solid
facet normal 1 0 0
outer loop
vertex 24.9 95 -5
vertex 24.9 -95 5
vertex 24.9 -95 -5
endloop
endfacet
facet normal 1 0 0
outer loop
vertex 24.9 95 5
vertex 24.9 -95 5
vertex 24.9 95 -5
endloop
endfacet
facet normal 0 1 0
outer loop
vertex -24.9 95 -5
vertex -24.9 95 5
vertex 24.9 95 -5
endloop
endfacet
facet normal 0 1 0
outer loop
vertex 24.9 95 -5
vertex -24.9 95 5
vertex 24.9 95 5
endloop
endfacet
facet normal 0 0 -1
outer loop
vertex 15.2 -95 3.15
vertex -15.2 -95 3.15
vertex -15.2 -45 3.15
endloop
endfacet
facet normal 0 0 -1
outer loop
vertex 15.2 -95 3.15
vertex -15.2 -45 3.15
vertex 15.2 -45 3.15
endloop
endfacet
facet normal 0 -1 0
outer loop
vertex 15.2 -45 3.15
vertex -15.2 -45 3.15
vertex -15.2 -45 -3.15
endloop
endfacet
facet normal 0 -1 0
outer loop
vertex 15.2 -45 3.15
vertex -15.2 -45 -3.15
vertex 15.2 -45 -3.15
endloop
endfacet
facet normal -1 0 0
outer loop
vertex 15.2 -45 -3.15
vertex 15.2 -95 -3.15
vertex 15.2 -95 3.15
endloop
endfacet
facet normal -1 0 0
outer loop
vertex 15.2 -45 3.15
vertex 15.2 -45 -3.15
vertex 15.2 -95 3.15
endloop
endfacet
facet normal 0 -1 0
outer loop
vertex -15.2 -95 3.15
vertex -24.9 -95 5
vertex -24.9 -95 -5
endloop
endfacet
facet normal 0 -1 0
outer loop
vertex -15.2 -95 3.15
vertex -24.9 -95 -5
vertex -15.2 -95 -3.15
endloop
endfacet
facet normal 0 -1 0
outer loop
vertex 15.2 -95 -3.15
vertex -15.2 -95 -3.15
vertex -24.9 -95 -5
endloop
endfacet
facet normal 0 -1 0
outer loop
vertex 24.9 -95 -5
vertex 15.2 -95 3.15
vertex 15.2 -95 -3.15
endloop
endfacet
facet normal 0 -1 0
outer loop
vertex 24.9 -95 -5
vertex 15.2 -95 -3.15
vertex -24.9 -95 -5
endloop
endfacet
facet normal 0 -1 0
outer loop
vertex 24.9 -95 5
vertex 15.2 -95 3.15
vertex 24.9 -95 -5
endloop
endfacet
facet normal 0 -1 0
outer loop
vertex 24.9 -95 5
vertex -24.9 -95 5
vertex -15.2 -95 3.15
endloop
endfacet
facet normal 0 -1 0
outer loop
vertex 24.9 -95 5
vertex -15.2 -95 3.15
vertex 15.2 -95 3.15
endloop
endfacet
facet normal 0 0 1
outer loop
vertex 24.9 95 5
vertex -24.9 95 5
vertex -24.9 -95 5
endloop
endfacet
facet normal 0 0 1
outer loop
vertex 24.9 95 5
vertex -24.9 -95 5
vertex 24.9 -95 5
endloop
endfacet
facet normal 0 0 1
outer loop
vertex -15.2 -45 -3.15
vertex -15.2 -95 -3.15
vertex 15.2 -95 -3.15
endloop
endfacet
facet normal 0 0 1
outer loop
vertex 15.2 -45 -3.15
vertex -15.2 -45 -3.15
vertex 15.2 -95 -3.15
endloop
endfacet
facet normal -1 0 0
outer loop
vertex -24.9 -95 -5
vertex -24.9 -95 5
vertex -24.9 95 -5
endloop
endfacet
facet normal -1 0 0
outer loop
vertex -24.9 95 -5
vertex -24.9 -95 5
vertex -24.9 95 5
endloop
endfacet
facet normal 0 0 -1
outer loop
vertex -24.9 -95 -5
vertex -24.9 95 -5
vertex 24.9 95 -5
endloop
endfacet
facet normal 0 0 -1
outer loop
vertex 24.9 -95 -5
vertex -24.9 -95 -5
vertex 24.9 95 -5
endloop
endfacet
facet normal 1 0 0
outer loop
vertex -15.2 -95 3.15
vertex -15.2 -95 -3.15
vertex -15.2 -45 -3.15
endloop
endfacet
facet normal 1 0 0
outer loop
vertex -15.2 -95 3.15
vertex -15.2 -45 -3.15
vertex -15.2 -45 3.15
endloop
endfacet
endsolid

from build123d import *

# Parameters (mm, degrees)
SKETCH_1_W          = 49.8
SKETCH_1_H          = 190
EXTRUDE_1_DEPTH     = 5
SKETCH_3_W          = 30.4
SKETCH_3_H          = 6.3
CUT_EXTRUDE_1_DEPTH = 50


with BuildPart() as part:
    # 草图1 → 凸台-拉伸1 (new, symmetric)
    with BuildSketch(Plane.XY):
        Rectangle(SKETCH_1_W, SKETCH_1_H)
    extrude(amount=EXTRUDE_1_DEPTH, both=True)

    # 草图3 → 切除-拉伸1 (cut)
    with BuildSketch(Plane.XZ.offset(95)):
        Rectangle(SKETCH_3_W, SKETCH_3_H)
    extrude(amount=-CUT_EXTRUDE_1_DEPTH, mode=Mode.SUBTRACT)


solid = part.part
